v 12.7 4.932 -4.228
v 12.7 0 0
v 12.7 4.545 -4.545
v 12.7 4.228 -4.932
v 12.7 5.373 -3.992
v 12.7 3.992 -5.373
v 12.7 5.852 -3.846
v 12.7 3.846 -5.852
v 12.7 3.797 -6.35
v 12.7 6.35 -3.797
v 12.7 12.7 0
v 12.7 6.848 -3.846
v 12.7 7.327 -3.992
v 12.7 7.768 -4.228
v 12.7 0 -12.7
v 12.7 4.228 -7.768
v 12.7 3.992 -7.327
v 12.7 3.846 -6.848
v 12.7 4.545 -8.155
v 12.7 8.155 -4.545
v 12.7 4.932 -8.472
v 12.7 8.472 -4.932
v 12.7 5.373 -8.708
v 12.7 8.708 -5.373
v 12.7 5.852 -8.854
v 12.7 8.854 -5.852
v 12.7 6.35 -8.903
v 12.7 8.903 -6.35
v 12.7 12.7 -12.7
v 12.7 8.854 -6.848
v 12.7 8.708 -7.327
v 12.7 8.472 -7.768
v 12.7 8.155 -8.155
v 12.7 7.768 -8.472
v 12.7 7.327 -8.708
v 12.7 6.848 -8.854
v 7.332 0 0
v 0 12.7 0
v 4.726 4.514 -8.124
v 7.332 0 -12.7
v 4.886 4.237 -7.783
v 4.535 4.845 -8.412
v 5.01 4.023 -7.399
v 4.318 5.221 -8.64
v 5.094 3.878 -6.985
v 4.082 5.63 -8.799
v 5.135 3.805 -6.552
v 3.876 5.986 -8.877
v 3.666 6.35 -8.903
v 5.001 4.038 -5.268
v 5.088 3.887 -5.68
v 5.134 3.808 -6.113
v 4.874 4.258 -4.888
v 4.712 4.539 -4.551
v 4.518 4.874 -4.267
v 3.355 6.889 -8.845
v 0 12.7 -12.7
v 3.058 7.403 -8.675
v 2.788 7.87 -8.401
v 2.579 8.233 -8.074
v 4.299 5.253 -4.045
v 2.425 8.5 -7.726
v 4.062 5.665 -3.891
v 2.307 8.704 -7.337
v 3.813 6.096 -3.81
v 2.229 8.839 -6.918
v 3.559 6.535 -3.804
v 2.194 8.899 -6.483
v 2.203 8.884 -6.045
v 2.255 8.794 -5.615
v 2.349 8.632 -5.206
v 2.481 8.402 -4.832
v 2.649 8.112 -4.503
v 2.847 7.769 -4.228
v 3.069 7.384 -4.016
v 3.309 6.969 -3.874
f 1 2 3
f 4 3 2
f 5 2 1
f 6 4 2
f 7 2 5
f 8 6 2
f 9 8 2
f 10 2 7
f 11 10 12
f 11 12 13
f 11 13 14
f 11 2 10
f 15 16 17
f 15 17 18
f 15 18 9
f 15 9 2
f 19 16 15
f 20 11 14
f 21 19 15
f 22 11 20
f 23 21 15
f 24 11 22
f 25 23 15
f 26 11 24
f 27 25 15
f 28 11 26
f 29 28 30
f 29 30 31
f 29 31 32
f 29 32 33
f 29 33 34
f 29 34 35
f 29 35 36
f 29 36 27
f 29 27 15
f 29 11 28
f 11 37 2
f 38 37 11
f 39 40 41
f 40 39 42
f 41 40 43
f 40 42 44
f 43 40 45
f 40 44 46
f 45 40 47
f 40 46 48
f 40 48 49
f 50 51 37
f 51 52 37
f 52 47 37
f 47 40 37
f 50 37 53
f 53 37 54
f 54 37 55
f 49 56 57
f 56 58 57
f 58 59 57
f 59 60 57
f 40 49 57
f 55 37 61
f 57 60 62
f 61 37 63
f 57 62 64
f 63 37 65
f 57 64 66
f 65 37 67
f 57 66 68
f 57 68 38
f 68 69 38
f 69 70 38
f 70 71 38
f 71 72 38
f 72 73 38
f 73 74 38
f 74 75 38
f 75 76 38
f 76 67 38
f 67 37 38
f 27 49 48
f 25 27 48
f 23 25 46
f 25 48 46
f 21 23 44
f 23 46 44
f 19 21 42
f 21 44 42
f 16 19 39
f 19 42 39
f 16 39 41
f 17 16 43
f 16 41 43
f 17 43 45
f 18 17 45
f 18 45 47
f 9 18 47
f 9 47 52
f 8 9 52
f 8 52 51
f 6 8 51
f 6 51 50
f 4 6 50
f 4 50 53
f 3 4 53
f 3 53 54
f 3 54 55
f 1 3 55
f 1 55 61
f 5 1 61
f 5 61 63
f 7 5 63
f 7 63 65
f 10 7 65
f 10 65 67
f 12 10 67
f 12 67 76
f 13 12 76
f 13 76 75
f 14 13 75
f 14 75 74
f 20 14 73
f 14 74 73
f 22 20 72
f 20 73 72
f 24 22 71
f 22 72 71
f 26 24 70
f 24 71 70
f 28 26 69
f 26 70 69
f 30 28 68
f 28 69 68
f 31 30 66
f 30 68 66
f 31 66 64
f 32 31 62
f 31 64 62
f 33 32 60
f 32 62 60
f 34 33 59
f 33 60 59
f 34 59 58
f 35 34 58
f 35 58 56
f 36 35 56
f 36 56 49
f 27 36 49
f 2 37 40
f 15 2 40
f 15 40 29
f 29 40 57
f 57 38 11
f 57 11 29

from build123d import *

# Parameters (mm, degrees)
SKETCH1_W              = 12.7
SKETCH1_H              = 12.7
BOSS_EXTRUDE1_DEPTH    = 12.7
CUT_EXTRUDE1_DEPTH     = 13.7
F_10_CLEARANCE_HOLE1_D = 5.1054


with BuildPart() as part:
    # Sketch1 → Boss-Extrude1 (new body)
    with BuildSketch(Plane(origin=(0, 0, 0), x_dir=(0, 0, -1), z_dir=(1, 0, 0))):
        with Locations((6.35, 6.35)):
            Rectangle(SKETCH1_W, SKETCH1_H)
    extrude(amount=BOSS_EXTRUDE1_DEPTH)

    # Sketch2 → Cut-Extrude1 (cut, through all)
    with BuildSketch(Plane.XY):
        Polygon((7.332348419, 0), (0, 12.7), (0, 0), align=None)
    extrude(amount=-CUT_EXTRUDE1_DEPTH, mode=Mode.SUBTRACT)

    # #10 Clearance Hole1 (through all)
    with Locations(Plane(origin=(12.7, 6.35, -6.35), x_dir=(0, 0, 1), z_dir=(1, 0, 0))):
        with Locations((0, 0)):
            Hole(F_10_CLEARANCE_HOLE1_D / 2)


solid = part.part
